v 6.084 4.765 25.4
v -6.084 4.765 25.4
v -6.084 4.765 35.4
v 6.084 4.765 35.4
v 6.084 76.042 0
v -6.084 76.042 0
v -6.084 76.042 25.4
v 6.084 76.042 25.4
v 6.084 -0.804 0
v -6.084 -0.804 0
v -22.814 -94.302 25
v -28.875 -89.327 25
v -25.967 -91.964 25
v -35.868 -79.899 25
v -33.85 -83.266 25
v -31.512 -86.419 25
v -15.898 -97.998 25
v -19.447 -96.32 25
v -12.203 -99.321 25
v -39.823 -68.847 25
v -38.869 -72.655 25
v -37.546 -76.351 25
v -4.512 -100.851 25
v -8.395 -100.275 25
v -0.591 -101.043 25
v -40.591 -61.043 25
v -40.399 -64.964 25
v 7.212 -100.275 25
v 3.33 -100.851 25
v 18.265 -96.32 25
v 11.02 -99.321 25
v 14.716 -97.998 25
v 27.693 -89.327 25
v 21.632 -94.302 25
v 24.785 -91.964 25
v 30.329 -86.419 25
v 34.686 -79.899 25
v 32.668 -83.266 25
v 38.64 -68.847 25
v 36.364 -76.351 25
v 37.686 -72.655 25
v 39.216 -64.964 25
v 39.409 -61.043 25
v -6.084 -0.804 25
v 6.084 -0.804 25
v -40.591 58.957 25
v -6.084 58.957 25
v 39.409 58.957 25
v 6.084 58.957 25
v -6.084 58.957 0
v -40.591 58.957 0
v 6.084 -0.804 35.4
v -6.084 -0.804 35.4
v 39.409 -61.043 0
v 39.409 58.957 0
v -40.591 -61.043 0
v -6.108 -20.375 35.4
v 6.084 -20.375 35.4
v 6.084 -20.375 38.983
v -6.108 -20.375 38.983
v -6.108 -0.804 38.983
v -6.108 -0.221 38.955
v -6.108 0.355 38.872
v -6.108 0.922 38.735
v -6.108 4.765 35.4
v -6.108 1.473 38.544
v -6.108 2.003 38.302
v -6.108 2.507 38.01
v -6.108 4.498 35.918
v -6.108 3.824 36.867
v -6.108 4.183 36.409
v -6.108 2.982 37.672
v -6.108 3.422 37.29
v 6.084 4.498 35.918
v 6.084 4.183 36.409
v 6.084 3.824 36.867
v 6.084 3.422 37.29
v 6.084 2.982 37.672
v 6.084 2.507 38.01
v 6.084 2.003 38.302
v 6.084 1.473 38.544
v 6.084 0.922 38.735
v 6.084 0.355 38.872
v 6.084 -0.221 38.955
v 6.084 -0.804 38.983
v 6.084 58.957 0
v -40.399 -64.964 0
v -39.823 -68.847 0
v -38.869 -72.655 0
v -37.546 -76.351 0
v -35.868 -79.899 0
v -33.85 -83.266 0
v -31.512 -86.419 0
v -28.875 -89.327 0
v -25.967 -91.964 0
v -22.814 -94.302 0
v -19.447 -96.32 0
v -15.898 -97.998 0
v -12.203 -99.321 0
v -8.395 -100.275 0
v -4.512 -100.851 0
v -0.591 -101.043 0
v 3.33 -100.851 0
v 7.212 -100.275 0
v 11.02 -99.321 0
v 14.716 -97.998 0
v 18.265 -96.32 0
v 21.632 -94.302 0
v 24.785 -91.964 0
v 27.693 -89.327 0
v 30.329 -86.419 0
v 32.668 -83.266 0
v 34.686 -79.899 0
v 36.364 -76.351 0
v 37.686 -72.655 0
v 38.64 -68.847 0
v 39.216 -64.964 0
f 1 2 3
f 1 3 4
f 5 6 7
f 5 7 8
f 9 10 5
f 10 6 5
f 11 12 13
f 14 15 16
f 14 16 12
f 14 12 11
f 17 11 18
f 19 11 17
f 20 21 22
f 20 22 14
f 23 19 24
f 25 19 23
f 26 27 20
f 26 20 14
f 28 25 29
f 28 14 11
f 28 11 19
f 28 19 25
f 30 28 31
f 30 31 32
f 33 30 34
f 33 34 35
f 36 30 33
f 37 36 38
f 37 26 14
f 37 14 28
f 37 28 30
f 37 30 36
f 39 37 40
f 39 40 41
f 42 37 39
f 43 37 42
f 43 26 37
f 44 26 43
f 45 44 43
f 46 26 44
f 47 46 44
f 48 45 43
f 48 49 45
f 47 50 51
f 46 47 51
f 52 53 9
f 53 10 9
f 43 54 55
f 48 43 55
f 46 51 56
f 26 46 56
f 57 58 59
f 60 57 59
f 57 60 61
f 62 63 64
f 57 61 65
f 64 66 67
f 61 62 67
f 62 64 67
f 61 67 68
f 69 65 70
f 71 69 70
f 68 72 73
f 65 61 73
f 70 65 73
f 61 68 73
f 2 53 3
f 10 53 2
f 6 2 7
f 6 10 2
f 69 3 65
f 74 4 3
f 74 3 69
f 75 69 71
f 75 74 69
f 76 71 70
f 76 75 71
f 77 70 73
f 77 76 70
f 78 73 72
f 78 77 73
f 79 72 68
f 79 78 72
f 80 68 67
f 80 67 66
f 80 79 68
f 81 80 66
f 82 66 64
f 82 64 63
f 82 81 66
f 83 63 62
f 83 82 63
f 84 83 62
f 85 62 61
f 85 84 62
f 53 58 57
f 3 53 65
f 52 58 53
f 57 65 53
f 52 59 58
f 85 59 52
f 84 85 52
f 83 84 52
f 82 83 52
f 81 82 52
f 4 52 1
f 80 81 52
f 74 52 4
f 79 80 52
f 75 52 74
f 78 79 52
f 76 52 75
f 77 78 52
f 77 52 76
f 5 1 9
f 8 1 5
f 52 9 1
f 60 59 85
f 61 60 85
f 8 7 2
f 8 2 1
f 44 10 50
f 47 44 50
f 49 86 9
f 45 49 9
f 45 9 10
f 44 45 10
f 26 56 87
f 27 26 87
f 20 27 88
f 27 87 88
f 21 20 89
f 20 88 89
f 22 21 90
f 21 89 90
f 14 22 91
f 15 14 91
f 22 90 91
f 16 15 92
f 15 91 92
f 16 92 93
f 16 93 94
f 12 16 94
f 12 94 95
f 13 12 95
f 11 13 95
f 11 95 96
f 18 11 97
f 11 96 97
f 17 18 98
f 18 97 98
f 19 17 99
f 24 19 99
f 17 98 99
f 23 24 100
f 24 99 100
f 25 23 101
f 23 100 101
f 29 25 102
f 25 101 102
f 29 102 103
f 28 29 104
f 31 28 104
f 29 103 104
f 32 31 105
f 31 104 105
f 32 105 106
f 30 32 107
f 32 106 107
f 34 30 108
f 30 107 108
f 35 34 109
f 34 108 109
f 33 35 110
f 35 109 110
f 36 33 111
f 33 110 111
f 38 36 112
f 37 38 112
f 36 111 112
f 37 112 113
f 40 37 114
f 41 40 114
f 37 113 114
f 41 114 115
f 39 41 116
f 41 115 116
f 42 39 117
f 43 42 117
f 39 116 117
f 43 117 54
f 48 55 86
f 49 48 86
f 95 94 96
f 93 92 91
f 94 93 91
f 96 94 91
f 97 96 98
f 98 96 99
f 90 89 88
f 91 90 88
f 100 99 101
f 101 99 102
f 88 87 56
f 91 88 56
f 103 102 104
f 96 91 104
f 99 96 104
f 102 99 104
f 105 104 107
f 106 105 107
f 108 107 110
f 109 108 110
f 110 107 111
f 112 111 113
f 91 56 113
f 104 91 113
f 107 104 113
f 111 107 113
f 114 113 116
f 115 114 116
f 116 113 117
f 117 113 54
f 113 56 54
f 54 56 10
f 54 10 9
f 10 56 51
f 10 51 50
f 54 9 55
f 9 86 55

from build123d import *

# Parameters (mm, degrees)
F1_DEPTH = 25
F0_W     = 12.1671715751
F0_H     = 59.7603839328
F0_H_2   = 17.0849451576
F2_DEPTH = 25.4
F3_W     = 12.1671715751
F3_H     = 5.5680888814
F4_DEPTH = 10
F5_W     = 19.571596921
F5_H     = 3.5830507338
F6_DEPTH = 12.192


with BuildPart() as f1:
    # F0 (on Top) → F1 (new body)
    with BuildSketch(Plane.XY):
        Polygon((-6.0835857876, 58.9568352546), (-40.591121614, 58.9568352546), (-40.591121614, -61.0431647454), (39.408878386, -61.0431647454), (39.408878386, 58.9568352546), (6.0835857876, 58.9568352546), (6.0835857876, -0.8035486783), (-6.0835857876, -0.8035486783), align=None)
        with BuildLine():
            Line((39.408878386, -61.0431647454), (-40.591121614, -61.0431647454))
            ThreePointArc((-40.591121614, -61.0431647454), (-0.591121614, -101.0431647454), (39.408878386, -61.0431647454))
        make_face()
    extrude(amount=F1_DEPTH)


with BuildPart() as f2:
    # F0 (on Top) → F2 (new body)
    with BuildSketch(Plane.XY):
        with Locations((0, 29.0766432881)):
            Rectangle(F0_W, F0_H)
        with Locations((0, 67.4993078334)):
            Rectangle(F0_W, F0_H_2)
    extrude(amount=F2_DEPTH)

    # F3 (on face) → F4 (join)
    with BuildSketch(Plane.XY.offset(25.4)):
        with Locations((0, 1.9804957624)):
            Rectangle(F3_W, F3_H)
    extrude(amount=F4_DEPTH)

    # F5 (on face) → F6 (join)
    with BuildSketch(Plane.YZ.offset(6.0835857876)):
        with BuildLine():
            Line((-0.8035486783, 38.9830507338), (-0.8035486783, 35.4))
            Line((-0.8035486783, 35.4), (4.7645402032, 35.4))
            ThreePointArc((4.7645402032, 35.4), (2.5071108615, 38.0098893521), (-0.8035486783, 38.9830507338))
        make_face()
        with Locations((-10.5893471388, 37.1915253669)):
            Rectangle(F5_W, F5_H)
    extrude(amount=-F6_DEPTH)


solid = Compound([f1.part, f2.part])
